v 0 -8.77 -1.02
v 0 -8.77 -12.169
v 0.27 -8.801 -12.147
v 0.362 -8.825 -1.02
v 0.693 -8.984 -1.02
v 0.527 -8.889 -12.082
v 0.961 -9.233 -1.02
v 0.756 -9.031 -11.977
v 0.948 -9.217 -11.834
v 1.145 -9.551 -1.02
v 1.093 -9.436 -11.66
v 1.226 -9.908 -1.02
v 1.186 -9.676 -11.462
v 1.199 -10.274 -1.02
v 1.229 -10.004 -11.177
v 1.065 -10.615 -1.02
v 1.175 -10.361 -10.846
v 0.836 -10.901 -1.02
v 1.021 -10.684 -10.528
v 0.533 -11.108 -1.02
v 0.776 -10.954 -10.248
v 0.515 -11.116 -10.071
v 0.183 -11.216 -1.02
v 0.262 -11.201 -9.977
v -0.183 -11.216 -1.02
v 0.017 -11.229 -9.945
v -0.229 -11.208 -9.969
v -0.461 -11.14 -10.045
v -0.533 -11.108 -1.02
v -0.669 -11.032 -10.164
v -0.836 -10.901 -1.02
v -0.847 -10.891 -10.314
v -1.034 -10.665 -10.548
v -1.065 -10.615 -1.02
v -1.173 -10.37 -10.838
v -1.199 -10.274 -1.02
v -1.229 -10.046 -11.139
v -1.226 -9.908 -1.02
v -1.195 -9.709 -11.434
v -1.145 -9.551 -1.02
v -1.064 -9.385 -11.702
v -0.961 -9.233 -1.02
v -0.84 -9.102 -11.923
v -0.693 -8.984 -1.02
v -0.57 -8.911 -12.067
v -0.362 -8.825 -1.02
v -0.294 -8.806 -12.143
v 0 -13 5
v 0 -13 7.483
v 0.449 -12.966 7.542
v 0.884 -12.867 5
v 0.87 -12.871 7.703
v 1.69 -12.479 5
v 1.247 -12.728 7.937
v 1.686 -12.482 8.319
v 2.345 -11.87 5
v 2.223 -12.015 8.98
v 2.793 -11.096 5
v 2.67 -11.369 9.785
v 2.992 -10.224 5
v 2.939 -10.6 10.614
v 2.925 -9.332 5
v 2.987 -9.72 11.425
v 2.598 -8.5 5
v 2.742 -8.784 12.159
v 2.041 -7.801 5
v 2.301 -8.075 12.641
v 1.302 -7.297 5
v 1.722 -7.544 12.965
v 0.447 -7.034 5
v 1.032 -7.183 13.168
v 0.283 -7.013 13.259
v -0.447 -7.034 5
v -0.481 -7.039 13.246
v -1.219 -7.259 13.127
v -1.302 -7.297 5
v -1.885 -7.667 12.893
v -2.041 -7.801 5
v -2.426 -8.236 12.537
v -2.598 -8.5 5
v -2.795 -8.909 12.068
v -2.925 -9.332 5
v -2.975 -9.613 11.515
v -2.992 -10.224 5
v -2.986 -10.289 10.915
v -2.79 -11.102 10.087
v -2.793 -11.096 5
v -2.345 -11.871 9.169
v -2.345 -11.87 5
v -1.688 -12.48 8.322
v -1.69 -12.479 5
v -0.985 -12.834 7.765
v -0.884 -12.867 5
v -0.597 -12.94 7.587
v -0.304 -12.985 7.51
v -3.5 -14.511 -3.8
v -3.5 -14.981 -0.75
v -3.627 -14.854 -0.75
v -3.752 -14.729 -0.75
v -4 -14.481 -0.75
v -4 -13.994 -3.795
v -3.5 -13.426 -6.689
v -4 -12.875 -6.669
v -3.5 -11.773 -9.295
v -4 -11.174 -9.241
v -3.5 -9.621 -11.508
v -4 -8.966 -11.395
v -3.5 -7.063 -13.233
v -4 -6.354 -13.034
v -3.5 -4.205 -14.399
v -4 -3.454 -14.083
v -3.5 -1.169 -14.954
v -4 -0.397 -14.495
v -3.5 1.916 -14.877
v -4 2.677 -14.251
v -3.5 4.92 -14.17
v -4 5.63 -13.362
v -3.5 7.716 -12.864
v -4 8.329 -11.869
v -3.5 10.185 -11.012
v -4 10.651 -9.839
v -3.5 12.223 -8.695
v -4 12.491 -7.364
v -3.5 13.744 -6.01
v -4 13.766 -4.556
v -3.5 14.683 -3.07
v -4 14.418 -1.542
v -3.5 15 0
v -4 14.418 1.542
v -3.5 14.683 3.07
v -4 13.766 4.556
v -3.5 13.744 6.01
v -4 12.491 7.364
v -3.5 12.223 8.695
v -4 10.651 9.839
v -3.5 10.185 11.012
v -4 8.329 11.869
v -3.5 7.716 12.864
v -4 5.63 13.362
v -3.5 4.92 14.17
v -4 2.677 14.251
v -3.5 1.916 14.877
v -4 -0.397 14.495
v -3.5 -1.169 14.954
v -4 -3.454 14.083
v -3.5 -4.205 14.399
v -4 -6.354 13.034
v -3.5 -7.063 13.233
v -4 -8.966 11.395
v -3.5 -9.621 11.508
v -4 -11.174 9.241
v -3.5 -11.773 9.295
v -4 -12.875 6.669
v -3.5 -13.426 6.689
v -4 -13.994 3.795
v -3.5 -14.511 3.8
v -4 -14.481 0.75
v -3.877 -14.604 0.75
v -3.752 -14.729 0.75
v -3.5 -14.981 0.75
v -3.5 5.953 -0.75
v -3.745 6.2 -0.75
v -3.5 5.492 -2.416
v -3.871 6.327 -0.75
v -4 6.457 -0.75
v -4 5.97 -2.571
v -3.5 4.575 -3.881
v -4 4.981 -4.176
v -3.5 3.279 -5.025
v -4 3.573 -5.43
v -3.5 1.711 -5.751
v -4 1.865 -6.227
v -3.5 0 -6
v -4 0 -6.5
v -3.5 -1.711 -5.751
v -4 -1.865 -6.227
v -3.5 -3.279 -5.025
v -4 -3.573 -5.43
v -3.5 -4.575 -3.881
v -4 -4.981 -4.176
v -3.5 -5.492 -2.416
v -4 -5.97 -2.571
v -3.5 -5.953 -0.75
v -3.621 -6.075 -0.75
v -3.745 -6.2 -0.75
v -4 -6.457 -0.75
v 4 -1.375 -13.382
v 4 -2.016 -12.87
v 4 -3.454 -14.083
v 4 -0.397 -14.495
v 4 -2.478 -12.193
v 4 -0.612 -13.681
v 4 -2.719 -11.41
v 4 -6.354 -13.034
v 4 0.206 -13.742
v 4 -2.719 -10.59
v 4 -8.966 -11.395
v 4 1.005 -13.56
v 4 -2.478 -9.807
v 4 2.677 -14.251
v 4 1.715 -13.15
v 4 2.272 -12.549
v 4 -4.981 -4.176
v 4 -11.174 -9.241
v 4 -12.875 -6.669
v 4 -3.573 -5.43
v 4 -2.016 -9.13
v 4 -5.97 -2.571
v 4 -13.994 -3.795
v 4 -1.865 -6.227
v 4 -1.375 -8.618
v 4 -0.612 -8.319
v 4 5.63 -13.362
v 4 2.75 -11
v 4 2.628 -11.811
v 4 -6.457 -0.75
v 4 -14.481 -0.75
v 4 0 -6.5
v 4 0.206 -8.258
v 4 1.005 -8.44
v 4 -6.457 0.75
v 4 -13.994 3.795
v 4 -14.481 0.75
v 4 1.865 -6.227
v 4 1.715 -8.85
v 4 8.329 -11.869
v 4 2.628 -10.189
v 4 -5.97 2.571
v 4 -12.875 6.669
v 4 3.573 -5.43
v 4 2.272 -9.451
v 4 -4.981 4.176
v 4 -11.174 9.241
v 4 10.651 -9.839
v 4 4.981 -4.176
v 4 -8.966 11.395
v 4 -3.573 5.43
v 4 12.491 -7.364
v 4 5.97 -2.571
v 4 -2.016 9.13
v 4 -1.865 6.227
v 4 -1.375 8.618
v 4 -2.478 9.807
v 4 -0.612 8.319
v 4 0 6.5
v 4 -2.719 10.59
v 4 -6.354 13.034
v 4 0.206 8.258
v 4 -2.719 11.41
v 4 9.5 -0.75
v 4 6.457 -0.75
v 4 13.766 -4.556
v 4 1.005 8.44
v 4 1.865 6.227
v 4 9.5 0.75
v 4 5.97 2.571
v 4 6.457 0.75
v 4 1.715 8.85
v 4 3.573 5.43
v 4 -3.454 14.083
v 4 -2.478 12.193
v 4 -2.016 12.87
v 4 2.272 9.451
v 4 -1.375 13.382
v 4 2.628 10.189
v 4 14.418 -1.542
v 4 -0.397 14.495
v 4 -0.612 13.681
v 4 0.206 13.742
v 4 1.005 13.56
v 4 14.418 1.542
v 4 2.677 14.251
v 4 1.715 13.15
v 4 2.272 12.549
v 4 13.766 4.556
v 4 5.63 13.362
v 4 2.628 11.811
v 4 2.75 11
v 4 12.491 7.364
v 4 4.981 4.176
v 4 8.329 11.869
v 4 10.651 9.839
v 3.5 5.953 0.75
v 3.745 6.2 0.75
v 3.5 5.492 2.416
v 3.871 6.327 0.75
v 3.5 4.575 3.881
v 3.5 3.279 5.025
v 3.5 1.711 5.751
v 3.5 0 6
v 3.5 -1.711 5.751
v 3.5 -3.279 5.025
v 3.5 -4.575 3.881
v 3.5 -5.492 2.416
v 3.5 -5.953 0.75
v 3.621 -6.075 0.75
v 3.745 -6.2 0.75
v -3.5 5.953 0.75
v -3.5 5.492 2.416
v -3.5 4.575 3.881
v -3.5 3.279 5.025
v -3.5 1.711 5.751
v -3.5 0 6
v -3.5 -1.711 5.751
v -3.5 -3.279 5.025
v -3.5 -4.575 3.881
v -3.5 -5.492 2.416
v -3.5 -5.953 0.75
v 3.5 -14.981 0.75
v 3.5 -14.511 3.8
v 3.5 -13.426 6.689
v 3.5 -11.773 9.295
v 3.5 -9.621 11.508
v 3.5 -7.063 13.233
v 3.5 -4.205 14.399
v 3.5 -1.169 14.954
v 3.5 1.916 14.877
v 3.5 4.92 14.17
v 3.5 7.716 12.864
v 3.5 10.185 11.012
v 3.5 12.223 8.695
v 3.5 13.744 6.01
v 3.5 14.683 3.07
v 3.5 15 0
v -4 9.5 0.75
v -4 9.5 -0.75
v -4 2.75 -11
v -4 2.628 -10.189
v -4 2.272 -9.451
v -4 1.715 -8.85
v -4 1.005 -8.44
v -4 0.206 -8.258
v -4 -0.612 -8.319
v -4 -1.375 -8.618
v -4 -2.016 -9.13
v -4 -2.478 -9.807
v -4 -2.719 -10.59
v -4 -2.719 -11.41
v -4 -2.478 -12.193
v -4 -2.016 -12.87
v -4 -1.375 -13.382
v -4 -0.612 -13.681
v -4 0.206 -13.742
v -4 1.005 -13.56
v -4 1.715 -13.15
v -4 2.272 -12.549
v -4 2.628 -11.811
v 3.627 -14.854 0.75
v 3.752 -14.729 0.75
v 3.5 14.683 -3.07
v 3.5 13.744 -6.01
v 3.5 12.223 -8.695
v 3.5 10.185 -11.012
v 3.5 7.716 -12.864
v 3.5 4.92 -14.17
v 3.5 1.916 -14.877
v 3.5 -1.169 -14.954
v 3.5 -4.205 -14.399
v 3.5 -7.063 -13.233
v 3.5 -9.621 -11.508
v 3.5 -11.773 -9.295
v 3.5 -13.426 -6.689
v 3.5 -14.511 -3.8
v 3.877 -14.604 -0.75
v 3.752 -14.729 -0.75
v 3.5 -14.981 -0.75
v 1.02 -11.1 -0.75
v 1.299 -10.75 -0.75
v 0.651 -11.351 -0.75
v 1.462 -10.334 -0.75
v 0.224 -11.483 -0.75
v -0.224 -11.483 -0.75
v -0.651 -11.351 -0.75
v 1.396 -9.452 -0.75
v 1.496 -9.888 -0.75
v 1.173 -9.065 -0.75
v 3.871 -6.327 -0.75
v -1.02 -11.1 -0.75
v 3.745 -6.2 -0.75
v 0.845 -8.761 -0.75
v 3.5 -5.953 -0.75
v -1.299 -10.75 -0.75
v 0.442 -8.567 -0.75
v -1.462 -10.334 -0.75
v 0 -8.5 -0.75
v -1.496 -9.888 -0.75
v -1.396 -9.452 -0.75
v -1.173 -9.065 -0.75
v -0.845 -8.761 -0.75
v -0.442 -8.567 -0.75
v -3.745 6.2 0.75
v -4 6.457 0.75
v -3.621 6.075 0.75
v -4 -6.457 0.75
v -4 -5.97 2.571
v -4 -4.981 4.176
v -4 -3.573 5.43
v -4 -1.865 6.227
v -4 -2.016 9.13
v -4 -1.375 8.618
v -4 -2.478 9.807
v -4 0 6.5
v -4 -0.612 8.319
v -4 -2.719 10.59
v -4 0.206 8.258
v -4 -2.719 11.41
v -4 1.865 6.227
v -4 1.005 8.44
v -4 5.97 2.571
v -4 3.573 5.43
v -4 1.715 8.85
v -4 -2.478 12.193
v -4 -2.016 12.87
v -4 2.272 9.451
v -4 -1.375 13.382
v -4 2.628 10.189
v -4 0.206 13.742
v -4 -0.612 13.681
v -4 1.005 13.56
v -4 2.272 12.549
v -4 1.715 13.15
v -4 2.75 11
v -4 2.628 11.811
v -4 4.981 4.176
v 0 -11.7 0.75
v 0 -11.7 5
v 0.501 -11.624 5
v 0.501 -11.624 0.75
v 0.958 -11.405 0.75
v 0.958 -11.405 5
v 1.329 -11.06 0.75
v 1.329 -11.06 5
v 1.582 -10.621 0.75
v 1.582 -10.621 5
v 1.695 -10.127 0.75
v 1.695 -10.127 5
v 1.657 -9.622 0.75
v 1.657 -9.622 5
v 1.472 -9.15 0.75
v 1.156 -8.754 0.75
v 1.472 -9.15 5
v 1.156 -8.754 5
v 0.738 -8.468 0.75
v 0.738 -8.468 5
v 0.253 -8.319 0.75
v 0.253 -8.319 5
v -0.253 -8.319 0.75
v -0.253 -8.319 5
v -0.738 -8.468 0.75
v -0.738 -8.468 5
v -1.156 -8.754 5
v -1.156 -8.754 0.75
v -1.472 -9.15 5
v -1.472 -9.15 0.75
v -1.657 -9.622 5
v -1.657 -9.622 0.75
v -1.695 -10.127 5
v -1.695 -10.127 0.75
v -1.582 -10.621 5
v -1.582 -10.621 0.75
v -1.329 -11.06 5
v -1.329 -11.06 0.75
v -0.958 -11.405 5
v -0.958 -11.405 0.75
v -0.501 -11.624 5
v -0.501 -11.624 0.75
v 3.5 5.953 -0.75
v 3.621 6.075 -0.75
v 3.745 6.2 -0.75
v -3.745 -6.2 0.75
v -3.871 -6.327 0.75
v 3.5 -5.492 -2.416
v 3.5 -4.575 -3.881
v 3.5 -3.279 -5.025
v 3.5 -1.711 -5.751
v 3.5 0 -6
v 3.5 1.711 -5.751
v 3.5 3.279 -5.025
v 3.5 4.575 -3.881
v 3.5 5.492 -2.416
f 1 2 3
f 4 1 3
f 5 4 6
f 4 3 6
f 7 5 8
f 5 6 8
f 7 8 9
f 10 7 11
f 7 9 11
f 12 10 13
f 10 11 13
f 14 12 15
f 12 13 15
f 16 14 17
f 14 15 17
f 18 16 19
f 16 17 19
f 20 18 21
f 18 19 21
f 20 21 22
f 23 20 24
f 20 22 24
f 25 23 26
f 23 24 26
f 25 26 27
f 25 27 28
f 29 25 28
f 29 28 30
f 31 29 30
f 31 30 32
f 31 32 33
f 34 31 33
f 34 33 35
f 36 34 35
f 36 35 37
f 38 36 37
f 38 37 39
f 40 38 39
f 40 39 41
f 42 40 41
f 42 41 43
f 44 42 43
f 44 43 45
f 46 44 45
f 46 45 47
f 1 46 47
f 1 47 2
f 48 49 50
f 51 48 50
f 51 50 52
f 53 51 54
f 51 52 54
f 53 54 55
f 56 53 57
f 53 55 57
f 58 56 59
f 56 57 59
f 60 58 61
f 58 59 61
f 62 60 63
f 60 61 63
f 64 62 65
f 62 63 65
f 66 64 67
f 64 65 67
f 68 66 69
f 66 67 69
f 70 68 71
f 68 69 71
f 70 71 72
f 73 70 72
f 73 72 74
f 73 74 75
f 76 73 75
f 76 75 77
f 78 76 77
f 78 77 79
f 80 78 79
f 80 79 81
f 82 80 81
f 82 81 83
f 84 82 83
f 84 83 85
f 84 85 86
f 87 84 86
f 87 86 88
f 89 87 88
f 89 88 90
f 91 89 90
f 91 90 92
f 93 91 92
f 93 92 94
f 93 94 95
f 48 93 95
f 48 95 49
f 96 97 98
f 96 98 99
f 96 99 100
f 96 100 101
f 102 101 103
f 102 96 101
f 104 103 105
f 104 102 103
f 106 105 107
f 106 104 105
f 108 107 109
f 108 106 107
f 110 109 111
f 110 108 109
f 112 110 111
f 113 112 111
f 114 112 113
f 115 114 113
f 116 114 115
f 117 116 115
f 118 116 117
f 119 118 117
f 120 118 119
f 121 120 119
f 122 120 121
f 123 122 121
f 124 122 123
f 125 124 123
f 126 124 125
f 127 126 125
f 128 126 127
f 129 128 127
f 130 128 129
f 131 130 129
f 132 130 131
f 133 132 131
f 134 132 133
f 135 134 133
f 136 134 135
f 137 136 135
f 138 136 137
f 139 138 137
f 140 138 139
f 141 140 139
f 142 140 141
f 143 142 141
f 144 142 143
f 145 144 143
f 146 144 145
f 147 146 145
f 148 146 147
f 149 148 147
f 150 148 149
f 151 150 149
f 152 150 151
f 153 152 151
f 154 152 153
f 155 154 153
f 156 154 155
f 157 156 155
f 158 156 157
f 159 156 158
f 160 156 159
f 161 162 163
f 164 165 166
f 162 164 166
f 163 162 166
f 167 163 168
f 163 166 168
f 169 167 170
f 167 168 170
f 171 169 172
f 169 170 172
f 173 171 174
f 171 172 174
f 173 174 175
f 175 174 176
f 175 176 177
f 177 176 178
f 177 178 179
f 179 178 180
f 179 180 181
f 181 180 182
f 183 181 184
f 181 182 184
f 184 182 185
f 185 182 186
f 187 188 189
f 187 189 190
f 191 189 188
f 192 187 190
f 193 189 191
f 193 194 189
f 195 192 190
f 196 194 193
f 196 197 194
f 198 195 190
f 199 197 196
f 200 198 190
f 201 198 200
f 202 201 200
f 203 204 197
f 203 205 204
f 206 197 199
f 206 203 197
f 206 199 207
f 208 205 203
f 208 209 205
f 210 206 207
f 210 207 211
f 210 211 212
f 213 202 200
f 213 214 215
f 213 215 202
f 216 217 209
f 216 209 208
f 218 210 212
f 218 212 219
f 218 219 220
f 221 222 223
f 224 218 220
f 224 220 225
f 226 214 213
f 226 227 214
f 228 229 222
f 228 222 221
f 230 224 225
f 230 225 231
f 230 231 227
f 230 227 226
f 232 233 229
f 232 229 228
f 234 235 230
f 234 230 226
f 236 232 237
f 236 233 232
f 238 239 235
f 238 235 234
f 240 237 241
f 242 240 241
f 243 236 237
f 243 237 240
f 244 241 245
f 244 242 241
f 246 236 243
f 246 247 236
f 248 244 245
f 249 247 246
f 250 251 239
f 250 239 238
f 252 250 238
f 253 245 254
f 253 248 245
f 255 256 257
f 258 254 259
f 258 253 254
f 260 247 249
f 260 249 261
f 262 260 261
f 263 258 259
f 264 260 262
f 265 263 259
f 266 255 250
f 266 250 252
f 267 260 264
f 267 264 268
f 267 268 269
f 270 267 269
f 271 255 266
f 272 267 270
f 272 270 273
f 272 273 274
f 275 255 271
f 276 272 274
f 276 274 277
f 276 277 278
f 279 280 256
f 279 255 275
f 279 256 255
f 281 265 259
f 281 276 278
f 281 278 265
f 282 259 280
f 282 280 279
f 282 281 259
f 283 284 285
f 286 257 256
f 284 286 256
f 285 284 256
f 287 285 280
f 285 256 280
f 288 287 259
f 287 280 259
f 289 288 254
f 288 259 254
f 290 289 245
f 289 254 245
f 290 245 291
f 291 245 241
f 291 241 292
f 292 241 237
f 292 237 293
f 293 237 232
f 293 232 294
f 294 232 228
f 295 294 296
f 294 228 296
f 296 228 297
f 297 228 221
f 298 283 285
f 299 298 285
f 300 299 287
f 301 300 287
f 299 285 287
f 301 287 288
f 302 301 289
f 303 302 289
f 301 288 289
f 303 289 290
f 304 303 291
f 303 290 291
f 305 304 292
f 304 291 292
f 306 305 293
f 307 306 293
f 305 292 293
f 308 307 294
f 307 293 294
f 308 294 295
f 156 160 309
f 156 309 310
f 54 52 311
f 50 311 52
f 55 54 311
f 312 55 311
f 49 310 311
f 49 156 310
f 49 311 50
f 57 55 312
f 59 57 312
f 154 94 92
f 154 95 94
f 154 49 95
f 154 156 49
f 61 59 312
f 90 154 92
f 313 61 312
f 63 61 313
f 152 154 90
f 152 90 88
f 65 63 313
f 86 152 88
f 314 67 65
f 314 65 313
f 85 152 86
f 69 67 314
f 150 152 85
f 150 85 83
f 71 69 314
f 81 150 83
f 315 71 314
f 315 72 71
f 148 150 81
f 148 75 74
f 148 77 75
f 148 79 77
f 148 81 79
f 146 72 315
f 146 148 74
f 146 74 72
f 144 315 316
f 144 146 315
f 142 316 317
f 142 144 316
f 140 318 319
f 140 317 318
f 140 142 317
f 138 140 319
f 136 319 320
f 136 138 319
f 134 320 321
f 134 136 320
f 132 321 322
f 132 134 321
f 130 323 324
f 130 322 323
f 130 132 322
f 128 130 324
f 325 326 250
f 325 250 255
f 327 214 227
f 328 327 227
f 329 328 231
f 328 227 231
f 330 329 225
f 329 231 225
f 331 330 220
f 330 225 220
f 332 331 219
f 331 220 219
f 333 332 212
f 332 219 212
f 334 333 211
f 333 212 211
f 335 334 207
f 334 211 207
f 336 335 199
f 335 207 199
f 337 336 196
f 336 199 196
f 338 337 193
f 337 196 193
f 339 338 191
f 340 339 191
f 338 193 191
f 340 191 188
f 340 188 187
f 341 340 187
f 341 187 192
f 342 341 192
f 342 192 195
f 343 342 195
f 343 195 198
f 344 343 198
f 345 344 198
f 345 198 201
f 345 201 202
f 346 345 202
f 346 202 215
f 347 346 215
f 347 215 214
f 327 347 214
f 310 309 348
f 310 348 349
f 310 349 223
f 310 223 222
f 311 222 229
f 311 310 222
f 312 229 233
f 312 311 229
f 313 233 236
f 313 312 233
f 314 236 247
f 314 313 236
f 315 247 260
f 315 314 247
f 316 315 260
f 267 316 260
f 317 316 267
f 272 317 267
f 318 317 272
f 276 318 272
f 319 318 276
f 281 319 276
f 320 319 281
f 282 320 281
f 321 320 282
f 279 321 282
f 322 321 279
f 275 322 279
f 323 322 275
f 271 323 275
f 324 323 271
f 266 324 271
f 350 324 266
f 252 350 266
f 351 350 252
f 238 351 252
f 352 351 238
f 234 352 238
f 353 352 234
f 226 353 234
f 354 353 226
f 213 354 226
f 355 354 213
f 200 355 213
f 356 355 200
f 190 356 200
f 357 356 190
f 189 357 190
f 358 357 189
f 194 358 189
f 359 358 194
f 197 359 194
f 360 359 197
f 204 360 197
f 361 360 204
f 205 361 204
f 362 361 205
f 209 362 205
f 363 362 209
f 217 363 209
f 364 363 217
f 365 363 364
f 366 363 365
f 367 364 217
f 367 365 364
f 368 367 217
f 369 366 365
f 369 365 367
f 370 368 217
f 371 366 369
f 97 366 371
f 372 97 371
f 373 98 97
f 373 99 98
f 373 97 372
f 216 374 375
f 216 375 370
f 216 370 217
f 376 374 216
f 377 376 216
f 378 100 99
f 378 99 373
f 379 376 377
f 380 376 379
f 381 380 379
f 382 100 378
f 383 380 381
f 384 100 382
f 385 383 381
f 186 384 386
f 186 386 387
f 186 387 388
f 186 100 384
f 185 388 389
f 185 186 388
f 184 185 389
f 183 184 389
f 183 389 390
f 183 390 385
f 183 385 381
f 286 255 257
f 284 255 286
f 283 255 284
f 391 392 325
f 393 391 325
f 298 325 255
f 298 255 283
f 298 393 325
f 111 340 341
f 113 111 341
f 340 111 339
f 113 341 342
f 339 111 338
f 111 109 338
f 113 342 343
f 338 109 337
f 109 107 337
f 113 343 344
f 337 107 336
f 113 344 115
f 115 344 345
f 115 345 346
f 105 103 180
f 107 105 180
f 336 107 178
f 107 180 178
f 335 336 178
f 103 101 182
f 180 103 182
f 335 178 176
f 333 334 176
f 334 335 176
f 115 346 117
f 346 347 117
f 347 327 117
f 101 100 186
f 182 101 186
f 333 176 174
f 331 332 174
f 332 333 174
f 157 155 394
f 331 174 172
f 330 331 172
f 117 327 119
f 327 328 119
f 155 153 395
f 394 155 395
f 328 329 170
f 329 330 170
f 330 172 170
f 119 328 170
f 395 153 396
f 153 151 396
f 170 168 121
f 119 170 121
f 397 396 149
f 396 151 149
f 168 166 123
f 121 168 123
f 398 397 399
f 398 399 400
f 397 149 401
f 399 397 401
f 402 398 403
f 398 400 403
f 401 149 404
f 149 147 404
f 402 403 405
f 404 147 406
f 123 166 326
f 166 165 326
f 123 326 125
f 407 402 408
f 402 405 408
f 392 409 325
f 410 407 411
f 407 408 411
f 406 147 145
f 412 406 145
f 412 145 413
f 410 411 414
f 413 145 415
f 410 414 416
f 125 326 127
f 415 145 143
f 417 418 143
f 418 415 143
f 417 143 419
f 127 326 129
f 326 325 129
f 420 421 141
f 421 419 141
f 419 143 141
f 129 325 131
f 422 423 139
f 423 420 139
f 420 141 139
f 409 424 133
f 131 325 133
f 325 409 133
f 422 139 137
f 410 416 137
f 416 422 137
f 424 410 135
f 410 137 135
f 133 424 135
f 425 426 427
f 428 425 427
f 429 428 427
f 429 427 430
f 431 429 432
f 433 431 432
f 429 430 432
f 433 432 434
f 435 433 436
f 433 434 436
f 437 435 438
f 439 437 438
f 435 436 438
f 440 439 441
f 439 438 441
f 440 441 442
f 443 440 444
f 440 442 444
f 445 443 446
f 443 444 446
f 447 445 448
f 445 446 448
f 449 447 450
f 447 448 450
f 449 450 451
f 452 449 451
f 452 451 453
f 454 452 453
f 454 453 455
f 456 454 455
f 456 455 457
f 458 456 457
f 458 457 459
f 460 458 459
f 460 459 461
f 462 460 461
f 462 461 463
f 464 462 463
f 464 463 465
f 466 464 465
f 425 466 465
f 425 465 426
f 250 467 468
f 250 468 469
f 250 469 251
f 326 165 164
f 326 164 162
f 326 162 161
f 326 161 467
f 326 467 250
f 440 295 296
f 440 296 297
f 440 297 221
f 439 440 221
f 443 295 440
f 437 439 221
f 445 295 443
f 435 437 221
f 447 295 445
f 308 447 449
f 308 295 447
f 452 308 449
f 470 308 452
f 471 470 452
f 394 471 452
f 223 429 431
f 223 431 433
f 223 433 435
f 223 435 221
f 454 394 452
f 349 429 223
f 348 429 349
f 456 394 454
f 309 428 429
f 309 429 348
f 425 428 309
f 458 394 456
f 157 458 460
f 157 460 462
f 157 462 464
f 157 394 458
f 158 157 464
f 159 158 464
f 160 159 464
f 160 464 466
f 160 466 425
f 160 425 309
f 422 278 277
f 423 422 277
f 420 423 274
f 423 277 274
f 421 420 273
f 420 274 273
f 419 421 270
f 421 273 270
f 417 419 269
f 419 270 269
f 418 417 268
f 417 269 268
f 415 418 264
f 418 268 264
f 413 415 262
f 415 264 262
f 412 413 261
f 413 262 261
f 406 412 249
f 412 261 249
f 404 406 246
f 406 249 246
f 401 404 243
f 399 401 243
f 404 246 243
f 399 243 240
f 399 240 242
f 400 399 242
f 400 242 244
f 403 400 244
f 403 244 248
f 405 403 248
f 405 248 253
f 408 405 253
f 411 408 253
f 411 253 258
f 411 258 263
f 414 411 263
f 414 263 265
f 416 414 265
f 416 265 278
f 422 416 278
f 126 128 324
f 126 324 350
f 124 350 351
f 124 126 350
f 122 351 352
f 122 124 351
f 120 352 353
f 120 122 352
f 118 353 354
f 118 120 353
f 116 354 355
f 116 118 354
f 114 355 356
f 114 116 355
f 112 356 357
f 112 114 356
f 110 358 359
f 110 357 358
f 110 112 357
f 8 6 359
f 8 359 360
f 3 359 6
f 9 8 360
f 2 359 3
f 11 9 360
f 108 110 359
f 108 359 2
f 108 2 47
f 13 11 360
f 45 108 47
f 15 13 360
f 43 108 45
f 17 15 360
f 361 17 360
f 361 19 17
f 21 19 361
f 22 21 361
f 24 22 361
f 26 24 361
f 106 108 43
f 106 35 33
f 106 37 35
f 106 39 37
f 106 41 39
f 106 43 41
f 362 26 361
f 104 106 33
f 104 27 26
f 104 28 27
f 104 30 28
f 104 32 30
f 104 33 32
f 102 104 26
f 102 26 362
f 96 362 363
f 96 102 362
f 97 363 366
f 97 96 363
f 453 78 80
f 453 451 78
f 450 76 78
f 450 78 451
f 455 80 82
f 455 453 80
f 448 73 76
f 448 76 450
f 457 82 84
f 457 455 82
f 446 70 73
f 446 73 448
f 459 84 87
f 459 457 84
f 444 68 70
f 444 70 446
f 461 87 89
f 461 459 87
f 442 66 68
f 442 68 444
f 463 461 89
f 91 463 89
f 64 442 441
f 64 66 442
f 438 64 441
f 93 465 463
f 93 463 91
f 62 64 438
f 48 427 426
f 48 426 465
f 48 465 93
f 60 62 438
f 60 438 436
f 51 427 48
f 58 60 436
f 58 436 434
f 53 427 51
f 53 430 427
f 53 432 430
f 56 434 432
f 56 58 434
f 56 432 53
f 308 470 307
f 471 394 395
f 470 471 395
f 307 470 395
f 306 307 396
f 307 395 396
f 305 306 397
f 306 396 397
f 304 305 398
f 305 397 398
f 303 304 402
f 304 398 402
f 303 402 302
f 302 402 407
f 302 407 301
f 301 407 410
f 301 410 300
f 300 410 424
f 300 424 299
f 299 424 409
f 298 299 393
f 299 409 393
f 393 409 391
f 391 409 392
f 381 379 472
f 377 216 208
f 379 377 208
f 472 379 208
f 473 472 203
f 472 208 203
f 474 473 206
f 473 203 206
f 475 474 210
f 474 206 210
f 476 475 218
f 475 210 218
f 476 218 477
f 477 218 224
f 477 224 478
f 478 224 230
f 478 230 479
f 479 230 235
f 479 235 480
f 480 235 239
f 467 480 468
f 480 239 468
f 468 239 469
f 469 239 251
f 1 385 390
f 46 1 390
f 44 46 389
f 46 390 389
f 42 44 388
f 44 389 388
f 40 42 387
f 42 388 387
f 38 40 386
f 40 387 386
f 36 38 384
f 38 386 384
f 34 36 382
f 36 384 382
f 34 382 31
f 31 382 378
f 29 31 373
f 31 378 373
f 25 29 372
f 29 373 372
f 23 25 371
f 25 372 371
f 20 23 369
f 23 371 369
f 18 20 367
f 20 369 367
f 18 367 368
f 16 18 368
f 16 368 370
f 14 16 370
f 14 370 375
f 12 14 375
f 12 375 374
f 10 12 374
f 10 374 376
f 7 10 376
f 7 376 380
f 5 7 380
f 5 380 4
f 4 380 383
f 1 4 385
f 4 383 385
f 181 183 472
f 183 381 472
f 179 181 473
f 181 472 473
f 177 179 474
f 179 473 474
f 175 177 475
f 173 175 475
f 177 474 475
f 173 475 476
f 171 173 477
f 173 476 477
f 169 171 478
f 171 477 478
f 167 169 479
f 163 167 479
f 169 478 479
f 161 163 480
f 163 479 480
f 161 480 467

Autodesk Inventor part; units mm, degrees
sketch "Sketch_1" plane through (0, 0, 0) normal (0, 0, 1) x (1, 0, 0)
  line L0 (4, 0) -> (-4, 0)
  line L1 (-4, 14.5) -> (-4, 6.5)
  line L2 (-4, 6.5) -> (-3.5, 6)
  line L3 (-3.5, 6) -> (3.5, 6)
  line L4 (3.5, 6) -> (4, 6.5)
  line L5 (4, 6.5) -> (4, 14.5)
  line L6 (4, 14.5) -> (3.5, 15)
  line L7 (3.5, 15) -> (-3.5, 15)
  line L8 (-3.5, 15) -> (-4, 14.5)
revolve "Revolution1" add sketch "Sketch_1" angle 360 about axis through (4, 0, 0) along (1, 0, 0)
sketch "Sketch_2" plane through (0, 0, 0) normal (1, 0, 0) x (0, 1, 0)
  line L0 (-15, 0.75) -> (-15, -0.75)
  line L1 (-15, -0.75) -> (9.5, -0.75)
  line L2 (9.5, -0.75) -> (9.5, 0.75)
  line L3 (9.5, 0.75) -> (-15, 0.75)
extrude "Extrusion1" cut sketch "Sketch_2" along normal mid plane 8
sketch "Sketch_3" plane through (0, 0, 0) normal (1, 0, 0) x (0, 1, 0)
  line L0 (-10, 15) -> (-10, 0)
  line L1 (-10, 0) -> (-11.7, 0)
  line L2 (-11.7, 0) -> (-11.7, 5)
  line L3 (-11.7, 5) -> (-13, 5)
  line L4 (-13, 5) -> (-13, 15)
  line L5 (-13, 15) -> (-10, 15)
  line L6 (-10, 15) -> (-10, 0)
revolve "Revolution2" cut sketch "Sketch_3" angle 360 about axis through (0, -10, 15) along (0, 0, 1)
sketch "Sketch_4" plane through (0, 0, 0) normal (1, 0, 0) x (0, 1, 0)
  line L0 (-10, -15.75) -> (-10, -0.75)
  line L1 (-10, -0.75) -> (-8.5, -0.75)
  line L2 (-8.5, -0.75) -> (-8.7705, -1.0205)
  line L3 (-8.7705, -1.0205) -> (-8.7705, -15.75)
  line L4 (-8.7705, -15.75) -> (-10, -15.75)
  line L5 (-10, -15.75) -> (-10, -0.75)
revolve "Revolution3" cut sketch "Sketch_4" angle 360 about axis through (0, -10, -15.75) along (0, 0, -1)
thread "Thread1" size "M3x0.5" class "6H" standard "ISO Metric profile" length 11.3387
sketch "Sketch_7" plane through (0, 0, 0) normal (1, 0, 0) x (0, 1, 0)
  circle A0 centre (0, -11) radius 2.75
extrude "Extrusion2" cut sketch "Sketch_7" along normal mid plane 16
sketch "Sketch_8" plane through (0, 0, 0) normal (1, 0, 0) x (0, 1, 0)
  circle A0 centre (0, 11) radius 2.75
extrude "Extrusion3" cut sketch "Sketch_8" along normal mid plane 16
ref_plane "body_screw_XY" through (0, -10, 5) normal (0, 0, 1) x (1, 0, 0)
ref_plane "body_screw_YZ" through (0, -10, 5) normal (1, 0, 0) x (0, 1, 0)
ref_plane "body_screw_ZX" through (0, -10, 5) normal (0, 1, 0) x (0, 0, 1)
properties part number "SSCSM12-8b"
